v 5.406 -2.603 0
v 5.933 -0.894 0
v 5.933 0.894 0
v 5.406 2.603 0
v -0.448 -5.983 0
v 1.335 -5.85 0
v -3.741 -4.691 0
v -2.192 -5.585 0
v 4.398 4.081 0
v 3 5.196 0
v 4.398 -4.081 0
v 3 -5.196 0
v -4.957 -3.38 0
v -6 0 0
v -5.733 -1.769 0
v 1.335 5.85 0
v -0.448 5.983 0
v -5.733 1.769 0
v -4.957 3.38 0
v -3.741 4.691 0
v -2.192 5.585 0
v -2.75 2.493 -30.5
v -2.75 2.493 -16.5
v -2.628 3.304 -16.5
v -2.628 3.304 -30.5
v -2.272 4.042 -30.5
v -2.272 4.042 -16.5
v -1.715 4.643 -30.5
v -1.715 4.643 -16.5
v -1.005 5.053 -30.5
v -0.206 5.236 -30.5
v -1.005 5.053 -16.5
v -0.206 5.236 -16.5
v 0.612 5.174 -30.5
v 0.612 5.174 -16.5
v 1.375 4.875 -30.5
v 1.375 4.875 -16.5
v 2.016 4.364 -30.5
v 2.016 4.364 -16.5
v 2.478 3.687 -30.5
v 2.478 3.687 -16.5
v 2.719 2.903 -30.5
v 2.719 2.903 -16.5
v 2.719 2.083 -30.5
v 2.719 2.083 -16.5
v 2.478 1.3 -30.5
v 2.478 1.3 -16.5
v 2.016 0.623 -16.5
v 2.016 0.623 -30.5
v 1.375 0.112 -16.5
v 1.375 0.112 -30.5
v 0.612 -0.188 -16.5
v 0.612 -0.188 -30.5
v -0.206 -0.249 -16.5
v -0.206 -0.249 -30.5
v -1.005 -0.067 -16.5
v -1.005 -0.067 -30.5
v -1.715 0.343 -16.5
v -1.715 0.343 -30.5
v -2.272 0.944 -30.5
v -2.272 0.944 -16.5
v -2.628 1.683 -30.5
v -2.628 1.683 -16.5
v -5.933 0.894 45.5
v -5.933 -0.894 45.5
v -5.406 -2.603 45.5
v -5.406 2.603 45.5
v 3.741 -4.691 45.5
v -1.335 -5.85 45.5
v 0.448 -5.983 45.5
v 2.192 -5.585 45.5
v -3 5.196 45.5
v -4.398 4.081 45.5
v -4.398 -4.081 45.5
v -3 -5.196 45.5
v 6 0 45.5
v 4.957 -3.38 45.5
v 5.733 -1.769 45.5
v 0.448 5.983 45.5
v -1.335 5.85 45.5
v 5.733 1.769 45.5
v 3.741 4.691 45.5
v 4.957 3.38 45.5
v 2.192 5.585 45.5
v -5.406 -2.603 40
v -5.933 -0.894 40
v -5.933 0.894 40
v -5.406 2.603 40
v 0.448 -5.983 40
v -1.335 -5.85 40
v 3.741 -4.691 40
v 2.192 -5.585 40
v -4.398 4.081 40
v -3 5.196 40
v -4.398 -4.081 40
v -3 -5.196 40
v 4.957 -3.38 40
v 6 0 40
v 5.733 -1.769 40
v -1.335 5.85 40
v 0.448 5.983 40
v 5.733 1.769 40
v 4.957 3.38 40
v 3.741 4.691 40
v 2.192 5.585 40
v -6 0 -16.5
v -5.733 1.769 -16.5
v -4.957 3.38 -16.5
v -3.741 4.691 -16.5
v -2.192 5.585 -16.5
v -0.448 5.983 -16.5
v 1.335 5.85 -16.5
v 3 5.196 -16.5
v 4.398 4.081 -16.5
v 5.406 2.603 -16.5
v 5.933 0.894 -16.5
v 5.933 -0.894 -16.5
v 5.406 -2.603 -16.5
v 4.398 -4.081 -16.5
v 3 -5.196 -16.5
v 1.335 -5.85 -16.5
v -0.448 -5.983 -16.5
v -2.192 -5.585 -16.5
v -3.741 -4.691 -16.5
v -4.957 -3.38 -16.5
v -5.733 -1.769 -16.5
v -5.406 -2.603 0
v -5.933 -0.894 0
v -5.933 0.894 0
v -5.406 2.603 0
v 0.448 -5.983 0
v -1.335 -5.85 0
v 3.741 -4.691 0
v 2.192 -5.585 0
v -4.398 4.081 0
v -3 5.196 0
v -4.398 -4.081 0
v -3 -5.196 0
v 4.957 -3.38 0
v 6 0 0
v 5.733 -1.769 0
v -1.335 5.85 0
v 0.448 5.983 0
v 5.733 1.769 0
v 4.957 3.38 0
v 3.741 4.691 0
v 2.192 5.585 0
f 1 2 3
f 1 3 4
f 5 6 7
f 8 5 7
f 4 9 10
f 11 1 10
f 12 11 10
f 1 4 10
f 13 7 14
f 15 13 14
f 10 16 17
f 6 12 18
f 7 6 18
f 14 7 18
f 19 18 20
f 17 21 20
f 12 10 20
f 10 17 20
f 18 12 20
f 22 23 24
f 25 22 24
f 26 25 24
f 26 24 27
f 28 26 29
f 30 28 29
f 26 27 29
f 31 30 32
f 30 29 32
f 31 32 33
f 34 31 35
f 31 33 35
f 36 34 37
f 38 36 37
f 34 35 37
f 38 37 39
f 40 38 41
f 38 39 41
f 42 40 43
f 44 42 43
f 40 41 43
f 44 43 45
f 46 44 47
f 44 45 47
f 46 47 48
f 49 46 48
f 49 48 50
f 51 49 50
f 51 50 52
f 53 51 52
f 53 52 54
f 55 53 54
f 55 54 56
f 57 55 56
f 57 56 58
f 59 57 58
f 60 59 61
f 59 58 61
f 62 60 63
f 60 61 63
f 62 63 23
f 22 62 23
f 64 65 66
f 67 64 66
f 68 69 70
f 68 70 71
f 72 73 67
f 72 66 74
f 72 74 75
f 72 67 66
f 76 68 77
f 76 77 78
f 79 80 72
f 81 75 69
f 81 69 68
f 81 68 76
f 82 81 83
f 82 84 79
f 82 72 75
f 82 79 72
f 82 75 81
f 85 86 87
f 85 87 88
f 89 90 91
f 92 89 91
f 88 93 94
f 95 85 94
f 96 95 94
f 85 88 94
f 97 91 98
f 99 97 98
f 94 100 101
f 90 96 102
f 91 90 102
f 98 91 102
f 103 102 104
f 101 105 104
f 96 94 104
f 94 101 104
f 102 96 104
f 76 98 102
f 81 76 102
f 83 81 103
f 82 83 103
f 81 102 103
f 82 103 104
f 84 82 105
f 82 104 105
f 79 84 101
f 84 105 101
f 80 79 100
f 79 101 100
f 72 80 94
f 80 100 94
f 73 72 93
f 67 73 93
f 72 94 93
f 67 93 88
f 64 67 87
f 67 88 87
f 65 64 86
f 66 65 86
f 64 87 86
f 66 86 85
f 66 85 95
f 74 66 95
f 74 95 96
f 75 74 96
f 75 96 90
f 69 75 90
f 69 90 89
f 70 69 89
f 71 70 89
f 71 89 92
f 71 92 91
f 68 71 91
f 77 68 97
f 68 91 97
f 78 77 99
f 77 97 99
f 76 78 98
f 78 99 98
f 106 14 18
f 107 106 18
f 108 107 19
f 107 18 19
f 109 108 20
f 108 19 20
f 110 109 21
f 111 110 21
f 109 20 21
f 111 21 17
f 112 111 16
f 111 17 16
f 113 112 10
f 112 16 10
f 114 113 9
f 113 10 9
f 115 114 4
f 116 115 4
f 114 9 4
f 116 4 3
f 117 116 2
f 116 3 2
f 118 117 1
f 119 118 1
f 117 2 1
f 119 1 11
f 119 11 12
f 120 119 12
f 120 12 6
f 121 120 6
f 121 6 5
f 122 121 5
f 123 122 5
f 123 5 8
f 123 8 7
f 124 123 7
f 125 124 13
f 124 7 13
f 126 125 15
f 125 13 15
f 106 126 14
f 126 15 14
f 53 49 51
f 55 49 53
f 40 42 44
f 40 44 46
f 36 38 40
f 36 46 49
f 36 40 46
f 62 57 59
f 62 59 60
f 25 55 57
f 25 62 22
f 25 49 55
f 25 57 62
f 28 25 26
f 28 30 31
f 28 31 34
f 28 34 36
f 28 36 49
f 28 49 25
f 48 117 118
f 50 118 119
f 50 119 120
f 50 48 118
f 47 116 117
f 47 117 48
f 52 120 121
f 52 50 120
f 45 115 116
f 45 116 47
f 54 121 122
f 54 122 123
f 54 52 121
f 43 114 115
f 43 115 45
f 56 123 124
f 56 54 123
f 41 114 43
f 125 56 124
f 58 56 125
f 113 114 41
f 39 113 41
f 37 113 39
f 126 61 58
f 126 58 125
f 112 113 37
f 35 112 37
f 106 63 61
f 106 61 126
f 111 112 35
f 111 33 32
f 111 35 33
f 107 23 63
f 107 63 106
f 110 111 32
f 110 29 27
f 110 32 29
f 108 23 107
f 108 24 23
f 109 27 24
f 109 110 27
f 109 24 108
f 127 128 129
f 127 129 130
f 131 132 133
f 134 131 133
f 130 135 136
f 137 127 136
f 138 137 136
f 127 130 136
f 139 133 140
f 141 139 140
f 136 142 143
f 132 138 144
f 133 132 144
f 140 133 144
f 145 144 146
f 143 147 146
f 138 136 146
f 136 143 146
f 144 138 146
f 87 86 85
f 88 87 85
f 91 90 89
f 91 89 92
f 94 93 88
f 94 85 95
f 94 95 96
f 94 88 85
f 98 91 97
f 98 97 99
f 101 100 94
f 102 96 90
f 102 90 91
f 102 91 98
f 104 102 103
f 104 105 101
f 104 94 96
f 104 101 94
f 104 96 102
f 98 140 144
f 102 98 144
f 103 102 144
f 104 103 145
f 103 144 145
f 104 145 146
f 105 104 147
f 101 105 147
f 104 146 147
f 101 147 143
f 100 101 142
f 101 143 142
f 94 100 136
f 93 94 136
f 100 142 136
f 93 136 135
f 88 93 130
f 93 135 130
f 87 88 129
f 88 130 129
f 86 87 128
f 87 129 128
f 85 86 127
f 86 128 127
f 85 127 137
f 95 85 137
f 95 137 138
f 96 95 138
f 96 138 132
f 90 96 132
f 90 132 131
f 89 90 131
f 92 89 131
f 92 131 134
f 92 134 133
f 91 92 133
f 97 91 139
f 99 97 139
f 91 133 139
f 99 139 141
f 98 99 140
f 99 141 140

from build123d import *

# Parameters (mm, degrees)
SKETCH1_R           = 6
BOSS_EXTRUDE1_DEPTH = 40
SKETCH2_R           = 6
BOSS_EXTRUDE2_DEPTH = 5.5
SKETCH3_R           = 6
BOSS_EXTRUDE3_DEPTH = 16.5
SKETCH4_R           = 2.75
BOSS_EXTRUDE4_DEPTH = 14


with BuildPart() as part:
    # Sketch1 → Boss-Extrude1 (new body)
    with BuildSketch(Plane.XY):
        Circle(SKETCH1_R)
    extrude(amount=BOSS_EXTRUDE1_DEPTH)


with BuildPart() as body_2:
    # Sketch2 → Boss-Extrude2 (new body)
    with BuildSketch(Plane.XY.offset(40)):
        Circle(SKETCH2_R)
    extrude(amount=BOSS_EXTRUDE2_DEPTH)


with BuildPart() as body_3:
    # Sketch3 → Boss-Extrude3 (new body)
    with BuildSketch(Plane(origin=(0, 0, 0), x_dir=(-1, 0, 0), z_dir=(0, 0, -1))):
        Circle(SKETCH3_R)
    extrude(amount=BOSS_EXTRUDE3_DEPTH)

    # Sketch4 → Boss-Extrude4 (add)
    with BuildSketch(Plane(origin=(0, 0, -16.5), x_dir=(-1, 0, 0), z_dir=(0, 0, -1))):
        with Locations((0, 2.493327733)):
            Circle(SKETCH4_R)
    extrude(amount=BOSS_EXTRUDE4_DEPTH)


solid = Compound([part.part, body_2.part, body_3.part])
